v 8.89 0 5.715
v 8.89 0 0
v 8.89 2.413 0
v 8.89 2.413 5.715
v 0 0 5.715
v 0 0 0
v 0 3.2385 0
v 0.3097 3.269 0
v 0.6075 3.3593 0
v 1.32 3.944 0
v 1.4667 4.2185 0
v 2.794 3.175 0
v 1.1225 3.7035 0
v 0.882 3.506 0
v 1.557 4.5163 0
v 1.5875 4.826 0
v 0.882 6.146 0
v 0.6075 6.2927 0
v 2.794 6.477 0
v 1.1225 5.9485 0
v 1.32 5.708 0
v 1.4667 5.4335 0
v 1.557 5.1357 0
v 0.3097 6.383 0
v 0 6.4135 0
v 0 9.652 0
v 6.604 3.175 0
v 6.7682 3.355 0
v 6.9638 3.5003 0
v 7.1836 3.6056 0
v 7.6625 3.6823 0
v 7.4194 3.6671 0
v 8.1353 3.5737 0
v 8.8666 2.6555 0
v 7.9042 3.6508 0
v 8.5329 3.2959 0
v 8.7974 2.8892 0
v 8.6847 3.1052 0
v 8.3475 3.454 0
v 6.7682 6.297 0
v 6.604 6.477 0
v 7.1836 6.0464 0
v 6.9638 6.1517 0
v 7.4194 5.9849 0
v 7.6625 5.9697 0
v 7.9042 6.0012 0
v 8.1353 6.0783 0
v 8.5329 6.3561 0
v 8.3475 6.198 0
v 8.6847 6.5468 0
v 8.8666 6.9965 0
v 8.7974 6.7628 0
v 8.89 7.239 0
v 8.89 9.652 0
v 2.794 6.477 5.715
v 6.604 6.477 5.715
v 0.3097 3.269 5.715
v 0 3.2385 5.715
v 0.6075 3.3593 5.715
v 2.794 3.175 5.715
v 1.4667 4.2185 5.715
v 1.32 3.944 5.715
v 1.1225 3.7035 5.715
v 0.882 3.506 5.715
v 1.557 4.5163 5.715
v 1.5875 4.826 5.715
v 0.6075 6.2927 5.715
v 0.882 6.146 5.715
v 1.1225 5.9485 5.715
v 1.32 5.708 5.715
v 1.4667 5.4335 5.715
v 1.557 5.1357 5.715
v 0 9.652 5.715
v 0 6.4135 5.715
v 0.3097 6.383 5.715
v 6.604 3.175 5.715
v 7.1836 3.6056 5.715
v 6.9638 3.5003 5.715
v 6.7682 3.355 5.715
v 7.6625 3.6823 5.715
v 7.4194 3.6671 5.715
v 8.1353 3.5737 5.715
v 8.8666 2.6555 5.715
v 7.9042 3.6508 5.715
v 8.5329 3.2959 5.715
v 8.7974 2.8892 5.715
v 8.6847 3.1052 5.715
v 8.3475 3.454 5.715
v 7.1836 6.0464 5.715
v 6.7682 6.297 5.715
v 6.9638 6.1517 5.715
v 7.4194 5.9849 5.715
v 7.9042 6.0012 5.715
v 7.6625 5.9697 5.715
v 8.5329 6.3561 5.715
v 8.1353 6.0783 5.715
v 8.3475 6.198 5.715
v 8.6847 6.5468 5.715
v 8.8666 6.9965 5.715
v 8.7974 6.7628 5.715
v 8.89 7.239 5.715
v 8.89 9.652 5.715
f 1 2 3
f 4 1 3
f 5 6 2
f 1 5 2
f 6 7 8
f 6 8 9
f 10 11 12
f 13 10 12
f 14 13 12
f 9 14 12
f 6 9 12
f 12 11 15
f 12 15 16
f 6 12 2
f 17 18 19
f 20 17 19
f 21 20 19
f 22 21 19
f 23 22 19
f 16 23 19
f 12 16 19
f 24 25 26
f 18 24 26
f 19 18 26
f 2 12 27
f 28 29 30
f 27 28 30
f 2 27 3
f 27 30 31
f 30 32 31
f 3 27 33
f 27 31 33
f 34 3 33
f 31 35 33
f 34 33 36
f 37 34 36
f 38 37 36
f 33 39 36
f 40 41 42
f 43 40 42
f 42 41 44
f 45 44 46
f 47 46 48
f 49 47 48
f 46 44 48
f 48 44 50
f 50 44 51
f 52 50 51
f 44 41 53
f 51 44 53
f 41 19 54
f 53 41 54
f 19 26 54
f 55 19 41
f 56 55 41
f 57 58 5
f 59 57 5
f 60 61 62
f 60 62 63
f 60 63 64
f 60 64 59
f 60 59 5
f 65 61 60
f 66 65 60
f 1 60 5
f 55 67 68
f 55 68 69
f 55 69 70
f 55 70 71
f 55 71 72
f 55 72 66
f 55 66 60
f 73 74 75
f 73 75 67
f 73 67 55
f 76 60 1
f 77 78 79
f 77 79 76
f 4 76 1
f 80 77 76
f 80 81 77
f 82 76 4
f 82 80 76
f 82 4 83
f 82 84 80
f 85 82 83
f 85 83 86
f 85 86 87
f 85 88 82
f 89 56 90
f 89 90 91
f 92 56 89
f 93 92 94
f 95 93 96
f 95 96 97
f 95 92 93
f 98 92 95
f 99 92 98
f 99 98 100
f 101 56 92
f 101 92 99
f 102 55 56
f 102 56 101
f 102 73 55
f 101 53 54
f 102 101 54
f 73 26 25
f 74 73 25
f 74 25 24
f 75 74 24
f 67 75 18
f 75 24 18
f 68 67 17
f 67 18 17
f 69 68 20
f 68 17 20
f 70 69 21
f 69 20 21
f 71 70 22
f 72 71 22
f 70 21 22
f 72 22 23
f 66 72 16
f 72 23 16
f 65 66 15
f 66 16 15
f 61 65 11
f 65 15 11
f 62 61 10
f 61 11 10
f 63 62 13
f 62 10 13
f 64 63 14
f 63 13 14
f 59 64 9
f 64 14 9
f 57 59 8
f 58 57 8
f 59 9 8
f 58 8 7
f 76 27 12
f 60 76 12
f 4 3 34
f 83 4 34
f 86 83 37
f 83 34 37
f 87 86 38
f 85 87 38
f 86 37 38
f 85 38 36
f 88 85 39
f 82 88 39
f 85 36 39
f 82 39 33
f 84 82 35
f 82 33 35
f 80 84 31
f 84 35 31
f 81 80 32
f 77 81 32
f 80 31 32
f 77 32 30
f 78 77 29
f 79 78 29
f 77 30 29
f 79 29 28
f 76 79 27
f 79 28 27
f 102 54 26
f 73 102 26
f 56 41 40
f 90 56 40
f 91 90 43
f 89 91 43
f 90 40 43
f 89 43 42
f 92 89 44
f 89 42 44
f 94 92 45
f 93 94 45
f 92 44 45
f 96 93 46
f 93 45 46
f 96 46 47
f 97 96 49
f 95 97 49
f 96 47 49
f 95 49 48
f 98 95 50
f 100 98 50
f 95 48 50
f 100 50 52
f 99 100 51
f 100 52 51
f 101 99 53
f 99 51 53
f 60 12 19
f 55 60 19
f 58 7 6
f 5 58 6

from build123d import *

# Parameters (mm, degrees)
F1_DEPTH = 5.715


with BuildPart() as f1:
    # F0 (on Top) → F1 (new body)
    with BuildSketch(Plane.XY):
        with BuildLine():
            Line((8.89, 9.652), (0, 9.652))
            Line((0, 9.652), (0, 6.4135))
            ThreePointArc((0, 6.4135), (1.5875, 4.826), (0, 3.2385))
            Line((0, 3.2385), (0, 0))
            Line((0, 0), (8.89, 0))
            Line((8.89, 0), (8.89, 2.413))
            ThreePointArc((8.89, 2.413), (8.021609, 3.617828), (6.604, 3.175))
            Line((6.604, 3.175), (2.794, 3.175))
            Line((2.794, 3.175), (2.794, 6.477))
            Line((2.794, 6.477), (6.604, 6.477))
            ThreePointArc((6.604, 6.477), (8.021609, 6.034172), (8.89, 7.239))
            Line((8.89, 7.239), (8.89, 9.652))
        make_face()
    extrude(amount=F1_DEPTH)


solid = f1.part
